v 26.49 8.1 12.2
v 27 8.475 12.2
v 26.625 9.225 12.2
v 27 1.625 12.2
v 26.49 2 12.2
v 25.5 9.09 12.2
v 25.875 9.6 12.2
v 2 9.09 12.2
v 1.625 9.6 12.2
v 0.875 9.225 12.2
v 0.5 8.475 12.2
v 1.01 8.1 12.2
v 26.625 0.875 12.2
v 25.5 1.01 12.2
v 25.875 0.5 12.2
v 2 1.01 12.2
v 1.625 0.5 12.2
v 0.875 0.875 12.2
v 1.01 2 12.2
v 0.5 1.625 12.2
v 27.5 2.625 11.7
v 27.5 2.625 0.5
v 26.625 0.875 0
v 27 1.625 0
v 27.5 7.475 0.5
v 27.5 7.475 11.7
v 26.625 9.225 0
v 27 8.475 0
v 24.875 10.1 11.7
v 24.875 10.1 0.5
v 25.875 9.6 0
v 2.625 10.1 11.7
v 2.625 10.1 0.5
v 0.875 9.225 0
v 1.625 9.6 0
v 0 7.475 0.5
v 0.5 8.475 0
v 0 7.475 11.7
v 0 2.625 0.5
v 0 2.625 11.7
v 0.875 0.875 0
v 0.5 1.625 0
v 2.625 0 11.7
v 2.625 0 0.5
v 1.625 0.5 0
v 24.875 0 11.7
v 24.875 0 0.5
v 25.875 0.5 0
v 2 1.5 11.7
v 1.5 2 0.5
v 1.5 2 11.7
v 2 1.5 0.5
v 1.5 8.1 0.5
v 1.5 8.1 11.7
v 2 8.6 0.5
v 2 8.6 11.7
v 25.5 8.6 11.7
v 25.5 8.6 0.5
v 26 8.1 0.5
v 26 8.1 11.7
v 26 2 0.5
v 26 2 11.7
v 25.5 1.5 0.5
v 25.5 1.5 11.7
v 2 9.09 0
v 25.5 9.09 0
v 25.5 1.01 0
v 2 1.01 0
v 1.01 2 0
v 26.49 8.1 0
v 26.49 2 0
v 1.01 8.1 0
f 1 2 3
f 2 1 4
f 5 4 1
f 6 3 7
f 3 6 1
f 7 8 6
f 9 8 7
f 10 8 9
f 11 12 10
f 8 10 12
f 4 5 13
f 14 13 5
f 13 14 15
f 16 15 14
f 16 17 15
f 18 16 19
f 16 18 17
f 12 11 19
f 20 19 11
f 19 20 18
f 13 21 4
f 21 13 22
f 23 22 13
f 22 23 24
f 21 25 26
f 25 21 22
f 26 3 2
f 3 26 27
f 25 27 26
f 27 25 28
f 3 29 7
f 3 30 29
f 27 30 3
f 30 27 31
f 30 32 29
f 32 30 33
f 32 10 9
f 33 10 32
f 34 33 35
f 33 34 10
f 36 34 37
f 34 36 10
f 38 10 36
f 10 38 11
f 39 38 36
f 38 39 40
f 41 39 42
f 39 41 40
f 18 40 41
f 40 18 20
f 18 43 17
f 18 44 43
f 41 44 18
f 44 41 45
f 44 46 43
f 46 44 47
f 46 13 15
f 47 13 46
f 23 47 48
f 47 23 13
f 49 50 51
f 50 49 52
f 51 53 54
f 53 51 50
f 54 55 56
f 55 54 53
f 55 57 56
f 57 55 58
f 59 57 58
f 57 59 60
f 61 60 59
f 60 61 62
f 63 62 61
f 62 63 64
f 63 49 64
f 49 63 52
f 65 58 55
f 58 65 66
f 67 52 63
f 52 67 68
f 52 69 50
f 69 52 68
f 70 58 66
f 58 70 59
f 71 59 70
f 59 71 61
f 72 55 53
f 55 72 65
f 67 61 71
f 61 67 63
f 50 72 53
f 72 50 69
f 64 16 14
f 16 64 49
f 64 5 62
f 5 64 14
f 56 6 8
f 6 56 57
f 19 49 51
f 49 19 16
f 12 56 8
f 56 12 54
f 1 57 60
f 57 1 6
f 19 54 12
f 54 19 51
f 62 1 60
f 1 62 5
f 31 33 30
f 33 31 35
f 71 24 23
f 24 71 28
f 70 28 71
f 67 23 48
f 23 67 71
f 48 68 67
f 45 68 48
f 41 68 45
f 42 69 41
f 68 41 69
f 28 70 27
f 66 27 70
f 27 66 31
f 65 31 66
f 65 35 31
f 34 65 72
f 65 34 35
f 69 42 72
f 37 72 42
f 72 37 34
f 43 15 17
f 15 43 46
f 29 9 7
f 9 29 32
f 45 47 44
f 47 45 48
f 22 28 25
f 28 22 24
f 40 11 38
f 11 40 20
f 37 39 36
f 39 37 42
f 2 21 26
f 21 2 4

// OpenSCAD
// created by IndiePandaaaaa

// original [mm]
thickness = 1.5;
depth = 12.2;
innerHeight = 7.1;
//innerWidth = 22.3;

// optimizations:
innerWidth = 24.5;
chamfer = 0.5;
chamferPyramid = 0.5;

module pyra(chamferPyra = 0.25) {
  polyhedron(
  points = [
    // INNER FACE
      [thickness, thickness + chamfer, chamferPyra], //0
      [thickness + chamfer, thickness, chamferPyra], //1
      [thickness + innerWidth - chamfer, thickness, chamferPyra], //2
      [thickness + innerWidth, thickness + chamfer, chamferPyra], //3
      [thickness + innerWidth, thickness + innerHeight - chamfer, chamferPyra], //4
      [thickness + innerWidth - chamfer, thickness + innerHeight, chamferPyra], //5
      [thickness + chamfer, thickness + innerHeight, chamferPyra], //6
      [thickness, thickness + innerHeight - chamfer, chamferPyra], //7
    // OUTER FACE
      [thickness - chamferPyra, thickness + chamfer, -0.01], //8
      [thickness + chamfer, thickness - chamferPyra, -0.01], //9
      [thickness + innerWidth - chamfer, thickness - chamferPyra, -0.01], //10
      [thickness + innerWidth + chamferPyra, thickness + chamfer, -0.01], //11
      [thickness + innerWidth + chamferPyra, thickness + innerHeight - chamfer, -0.01], //12
      [thickness + innerWidth - chamfer, thickness + innerHeight + chamferPyra, -0.01], //13
      [thickness + chamfer, thickness + innerHeight + chamferPyra, -0.01], //14
      [thickness - chamferPyra, thickness + innerHeight - chamfer, -0.01], //15
    ],
  faces = [
      [7, 6, 5, 4, 3, 2, 1, 0], //0
      [0, 1, 9, 8], //1
      [1, 2, 10, 9], //2
      [2, 3, 11, 10], //3
      [3, 4, 12, 11], //4
      [4, 5, 13, 12], //5
      [5, 6, 14, 13], //6
      [6, 7, 15, 14], //7
      [7, 0, 8, 15], //8
      [8, 9, 10, 11, 12, 13, 14, 15], //9
    ]
  );
}

intersection() {
  difference() {
    linear_extrude(height = depth) {
      difference() {
        outer_chamfer = chamfer + thickness - 0.25;
        polygon([
            [0, outer_chamfer / 2 * 3],
            [outer_chamfer / 2, outer_chamfer / 2],
            [outer_chamfer / 2 * 3, 0],
            [thickness * 2 + innerWidth - outer_chamfer / 2 * 3, 0],
            [thickness * 2 + innerWidth - outer_chamfer / 2, outer_chamfer / 2],
            [thickness * 2 + innerWidth, outer_chamfer / 2 * 3],
            [thickness * 2 + innerWidth, thickness * 2 + innerHeight - outer_chamfer / 2 * 3],
            [thickness * 2 + innerWidth - outer_chamfer / 2, thickness * 2 + innerHeight - outer_chamfer / 2
            ],
            [thickness * 2 + innerWidth - outer_chamfer / 2 * 3, thickness * 2 + innerHeight],
            [outer_chamfer / 2 * 3, thickness * 2 + innerHeight],
            [outer_chamfer / 2, thickness * 2 + innerHeight - outer_chamfer / 2],
            [0, thickness * 2 + innerHeight - outer_chamfer / 2 * 3],
          ]);
        polygon([
            [thickness, thickness + chamfer],
            [thickness + chamfer, thickness],
            [thickness + innerWidth - chamfer, thickness],
            [thickness + innerWidth, thickness + chamfer],
            [thickness + innerWidth, thickness + innerHeight - chamfer],
            [thickness + innerWidth - chamfer, thickness + innerHeight],
            [thickness + chamfer, thickness + innerHeight],
            [thickness, thickness + innerHeight - chamfer],
          ]);
      }
    }
    pyra(chamferPyramid);
    translate([innerWidth + thickness * 2, 0, depth])
      rotate([0, 180, 0]) pyra(chamferPyramid);
  }
  rotate([0, 90, 0]) translate([-depth, 0, 0]) {
    linear_extrude(innerWidth + thickness * 2) {
      polygon([
          [0, chamfer],
          [chamfer, 0],
          [depth - chamfer, 0],
          [depth, chamfer],
          [depth, innerHeight + thickness * 2 - chamfer],
          [depth - chamfer, innerHeight + thickness * 2],
          [chamfer, innerHeight + thickness * 2],
          [0, innerHeight + thickness * 2 - chamfer],
        ]);
    }
  }
  rotate([-90, 0, 0]) translate([0, -depth, 0]) {
    linear_extrude(innerHeight + thickness * 2) {
      polygon([
          [0, chamfer],
          [chamfer, 0],
          [innerWidth + 2 * thickness - chamfer, 0],
          [innerWidth + 2 * thickness, chamfer],
          [innerWidth + 2 * thickness, depth - chamfer],
          [innerWidth + 2 * thickness - chamfer, depth],
          [chamfer, depth],
          [0, depth - chamfer],
        ]);
    }
  }
}
